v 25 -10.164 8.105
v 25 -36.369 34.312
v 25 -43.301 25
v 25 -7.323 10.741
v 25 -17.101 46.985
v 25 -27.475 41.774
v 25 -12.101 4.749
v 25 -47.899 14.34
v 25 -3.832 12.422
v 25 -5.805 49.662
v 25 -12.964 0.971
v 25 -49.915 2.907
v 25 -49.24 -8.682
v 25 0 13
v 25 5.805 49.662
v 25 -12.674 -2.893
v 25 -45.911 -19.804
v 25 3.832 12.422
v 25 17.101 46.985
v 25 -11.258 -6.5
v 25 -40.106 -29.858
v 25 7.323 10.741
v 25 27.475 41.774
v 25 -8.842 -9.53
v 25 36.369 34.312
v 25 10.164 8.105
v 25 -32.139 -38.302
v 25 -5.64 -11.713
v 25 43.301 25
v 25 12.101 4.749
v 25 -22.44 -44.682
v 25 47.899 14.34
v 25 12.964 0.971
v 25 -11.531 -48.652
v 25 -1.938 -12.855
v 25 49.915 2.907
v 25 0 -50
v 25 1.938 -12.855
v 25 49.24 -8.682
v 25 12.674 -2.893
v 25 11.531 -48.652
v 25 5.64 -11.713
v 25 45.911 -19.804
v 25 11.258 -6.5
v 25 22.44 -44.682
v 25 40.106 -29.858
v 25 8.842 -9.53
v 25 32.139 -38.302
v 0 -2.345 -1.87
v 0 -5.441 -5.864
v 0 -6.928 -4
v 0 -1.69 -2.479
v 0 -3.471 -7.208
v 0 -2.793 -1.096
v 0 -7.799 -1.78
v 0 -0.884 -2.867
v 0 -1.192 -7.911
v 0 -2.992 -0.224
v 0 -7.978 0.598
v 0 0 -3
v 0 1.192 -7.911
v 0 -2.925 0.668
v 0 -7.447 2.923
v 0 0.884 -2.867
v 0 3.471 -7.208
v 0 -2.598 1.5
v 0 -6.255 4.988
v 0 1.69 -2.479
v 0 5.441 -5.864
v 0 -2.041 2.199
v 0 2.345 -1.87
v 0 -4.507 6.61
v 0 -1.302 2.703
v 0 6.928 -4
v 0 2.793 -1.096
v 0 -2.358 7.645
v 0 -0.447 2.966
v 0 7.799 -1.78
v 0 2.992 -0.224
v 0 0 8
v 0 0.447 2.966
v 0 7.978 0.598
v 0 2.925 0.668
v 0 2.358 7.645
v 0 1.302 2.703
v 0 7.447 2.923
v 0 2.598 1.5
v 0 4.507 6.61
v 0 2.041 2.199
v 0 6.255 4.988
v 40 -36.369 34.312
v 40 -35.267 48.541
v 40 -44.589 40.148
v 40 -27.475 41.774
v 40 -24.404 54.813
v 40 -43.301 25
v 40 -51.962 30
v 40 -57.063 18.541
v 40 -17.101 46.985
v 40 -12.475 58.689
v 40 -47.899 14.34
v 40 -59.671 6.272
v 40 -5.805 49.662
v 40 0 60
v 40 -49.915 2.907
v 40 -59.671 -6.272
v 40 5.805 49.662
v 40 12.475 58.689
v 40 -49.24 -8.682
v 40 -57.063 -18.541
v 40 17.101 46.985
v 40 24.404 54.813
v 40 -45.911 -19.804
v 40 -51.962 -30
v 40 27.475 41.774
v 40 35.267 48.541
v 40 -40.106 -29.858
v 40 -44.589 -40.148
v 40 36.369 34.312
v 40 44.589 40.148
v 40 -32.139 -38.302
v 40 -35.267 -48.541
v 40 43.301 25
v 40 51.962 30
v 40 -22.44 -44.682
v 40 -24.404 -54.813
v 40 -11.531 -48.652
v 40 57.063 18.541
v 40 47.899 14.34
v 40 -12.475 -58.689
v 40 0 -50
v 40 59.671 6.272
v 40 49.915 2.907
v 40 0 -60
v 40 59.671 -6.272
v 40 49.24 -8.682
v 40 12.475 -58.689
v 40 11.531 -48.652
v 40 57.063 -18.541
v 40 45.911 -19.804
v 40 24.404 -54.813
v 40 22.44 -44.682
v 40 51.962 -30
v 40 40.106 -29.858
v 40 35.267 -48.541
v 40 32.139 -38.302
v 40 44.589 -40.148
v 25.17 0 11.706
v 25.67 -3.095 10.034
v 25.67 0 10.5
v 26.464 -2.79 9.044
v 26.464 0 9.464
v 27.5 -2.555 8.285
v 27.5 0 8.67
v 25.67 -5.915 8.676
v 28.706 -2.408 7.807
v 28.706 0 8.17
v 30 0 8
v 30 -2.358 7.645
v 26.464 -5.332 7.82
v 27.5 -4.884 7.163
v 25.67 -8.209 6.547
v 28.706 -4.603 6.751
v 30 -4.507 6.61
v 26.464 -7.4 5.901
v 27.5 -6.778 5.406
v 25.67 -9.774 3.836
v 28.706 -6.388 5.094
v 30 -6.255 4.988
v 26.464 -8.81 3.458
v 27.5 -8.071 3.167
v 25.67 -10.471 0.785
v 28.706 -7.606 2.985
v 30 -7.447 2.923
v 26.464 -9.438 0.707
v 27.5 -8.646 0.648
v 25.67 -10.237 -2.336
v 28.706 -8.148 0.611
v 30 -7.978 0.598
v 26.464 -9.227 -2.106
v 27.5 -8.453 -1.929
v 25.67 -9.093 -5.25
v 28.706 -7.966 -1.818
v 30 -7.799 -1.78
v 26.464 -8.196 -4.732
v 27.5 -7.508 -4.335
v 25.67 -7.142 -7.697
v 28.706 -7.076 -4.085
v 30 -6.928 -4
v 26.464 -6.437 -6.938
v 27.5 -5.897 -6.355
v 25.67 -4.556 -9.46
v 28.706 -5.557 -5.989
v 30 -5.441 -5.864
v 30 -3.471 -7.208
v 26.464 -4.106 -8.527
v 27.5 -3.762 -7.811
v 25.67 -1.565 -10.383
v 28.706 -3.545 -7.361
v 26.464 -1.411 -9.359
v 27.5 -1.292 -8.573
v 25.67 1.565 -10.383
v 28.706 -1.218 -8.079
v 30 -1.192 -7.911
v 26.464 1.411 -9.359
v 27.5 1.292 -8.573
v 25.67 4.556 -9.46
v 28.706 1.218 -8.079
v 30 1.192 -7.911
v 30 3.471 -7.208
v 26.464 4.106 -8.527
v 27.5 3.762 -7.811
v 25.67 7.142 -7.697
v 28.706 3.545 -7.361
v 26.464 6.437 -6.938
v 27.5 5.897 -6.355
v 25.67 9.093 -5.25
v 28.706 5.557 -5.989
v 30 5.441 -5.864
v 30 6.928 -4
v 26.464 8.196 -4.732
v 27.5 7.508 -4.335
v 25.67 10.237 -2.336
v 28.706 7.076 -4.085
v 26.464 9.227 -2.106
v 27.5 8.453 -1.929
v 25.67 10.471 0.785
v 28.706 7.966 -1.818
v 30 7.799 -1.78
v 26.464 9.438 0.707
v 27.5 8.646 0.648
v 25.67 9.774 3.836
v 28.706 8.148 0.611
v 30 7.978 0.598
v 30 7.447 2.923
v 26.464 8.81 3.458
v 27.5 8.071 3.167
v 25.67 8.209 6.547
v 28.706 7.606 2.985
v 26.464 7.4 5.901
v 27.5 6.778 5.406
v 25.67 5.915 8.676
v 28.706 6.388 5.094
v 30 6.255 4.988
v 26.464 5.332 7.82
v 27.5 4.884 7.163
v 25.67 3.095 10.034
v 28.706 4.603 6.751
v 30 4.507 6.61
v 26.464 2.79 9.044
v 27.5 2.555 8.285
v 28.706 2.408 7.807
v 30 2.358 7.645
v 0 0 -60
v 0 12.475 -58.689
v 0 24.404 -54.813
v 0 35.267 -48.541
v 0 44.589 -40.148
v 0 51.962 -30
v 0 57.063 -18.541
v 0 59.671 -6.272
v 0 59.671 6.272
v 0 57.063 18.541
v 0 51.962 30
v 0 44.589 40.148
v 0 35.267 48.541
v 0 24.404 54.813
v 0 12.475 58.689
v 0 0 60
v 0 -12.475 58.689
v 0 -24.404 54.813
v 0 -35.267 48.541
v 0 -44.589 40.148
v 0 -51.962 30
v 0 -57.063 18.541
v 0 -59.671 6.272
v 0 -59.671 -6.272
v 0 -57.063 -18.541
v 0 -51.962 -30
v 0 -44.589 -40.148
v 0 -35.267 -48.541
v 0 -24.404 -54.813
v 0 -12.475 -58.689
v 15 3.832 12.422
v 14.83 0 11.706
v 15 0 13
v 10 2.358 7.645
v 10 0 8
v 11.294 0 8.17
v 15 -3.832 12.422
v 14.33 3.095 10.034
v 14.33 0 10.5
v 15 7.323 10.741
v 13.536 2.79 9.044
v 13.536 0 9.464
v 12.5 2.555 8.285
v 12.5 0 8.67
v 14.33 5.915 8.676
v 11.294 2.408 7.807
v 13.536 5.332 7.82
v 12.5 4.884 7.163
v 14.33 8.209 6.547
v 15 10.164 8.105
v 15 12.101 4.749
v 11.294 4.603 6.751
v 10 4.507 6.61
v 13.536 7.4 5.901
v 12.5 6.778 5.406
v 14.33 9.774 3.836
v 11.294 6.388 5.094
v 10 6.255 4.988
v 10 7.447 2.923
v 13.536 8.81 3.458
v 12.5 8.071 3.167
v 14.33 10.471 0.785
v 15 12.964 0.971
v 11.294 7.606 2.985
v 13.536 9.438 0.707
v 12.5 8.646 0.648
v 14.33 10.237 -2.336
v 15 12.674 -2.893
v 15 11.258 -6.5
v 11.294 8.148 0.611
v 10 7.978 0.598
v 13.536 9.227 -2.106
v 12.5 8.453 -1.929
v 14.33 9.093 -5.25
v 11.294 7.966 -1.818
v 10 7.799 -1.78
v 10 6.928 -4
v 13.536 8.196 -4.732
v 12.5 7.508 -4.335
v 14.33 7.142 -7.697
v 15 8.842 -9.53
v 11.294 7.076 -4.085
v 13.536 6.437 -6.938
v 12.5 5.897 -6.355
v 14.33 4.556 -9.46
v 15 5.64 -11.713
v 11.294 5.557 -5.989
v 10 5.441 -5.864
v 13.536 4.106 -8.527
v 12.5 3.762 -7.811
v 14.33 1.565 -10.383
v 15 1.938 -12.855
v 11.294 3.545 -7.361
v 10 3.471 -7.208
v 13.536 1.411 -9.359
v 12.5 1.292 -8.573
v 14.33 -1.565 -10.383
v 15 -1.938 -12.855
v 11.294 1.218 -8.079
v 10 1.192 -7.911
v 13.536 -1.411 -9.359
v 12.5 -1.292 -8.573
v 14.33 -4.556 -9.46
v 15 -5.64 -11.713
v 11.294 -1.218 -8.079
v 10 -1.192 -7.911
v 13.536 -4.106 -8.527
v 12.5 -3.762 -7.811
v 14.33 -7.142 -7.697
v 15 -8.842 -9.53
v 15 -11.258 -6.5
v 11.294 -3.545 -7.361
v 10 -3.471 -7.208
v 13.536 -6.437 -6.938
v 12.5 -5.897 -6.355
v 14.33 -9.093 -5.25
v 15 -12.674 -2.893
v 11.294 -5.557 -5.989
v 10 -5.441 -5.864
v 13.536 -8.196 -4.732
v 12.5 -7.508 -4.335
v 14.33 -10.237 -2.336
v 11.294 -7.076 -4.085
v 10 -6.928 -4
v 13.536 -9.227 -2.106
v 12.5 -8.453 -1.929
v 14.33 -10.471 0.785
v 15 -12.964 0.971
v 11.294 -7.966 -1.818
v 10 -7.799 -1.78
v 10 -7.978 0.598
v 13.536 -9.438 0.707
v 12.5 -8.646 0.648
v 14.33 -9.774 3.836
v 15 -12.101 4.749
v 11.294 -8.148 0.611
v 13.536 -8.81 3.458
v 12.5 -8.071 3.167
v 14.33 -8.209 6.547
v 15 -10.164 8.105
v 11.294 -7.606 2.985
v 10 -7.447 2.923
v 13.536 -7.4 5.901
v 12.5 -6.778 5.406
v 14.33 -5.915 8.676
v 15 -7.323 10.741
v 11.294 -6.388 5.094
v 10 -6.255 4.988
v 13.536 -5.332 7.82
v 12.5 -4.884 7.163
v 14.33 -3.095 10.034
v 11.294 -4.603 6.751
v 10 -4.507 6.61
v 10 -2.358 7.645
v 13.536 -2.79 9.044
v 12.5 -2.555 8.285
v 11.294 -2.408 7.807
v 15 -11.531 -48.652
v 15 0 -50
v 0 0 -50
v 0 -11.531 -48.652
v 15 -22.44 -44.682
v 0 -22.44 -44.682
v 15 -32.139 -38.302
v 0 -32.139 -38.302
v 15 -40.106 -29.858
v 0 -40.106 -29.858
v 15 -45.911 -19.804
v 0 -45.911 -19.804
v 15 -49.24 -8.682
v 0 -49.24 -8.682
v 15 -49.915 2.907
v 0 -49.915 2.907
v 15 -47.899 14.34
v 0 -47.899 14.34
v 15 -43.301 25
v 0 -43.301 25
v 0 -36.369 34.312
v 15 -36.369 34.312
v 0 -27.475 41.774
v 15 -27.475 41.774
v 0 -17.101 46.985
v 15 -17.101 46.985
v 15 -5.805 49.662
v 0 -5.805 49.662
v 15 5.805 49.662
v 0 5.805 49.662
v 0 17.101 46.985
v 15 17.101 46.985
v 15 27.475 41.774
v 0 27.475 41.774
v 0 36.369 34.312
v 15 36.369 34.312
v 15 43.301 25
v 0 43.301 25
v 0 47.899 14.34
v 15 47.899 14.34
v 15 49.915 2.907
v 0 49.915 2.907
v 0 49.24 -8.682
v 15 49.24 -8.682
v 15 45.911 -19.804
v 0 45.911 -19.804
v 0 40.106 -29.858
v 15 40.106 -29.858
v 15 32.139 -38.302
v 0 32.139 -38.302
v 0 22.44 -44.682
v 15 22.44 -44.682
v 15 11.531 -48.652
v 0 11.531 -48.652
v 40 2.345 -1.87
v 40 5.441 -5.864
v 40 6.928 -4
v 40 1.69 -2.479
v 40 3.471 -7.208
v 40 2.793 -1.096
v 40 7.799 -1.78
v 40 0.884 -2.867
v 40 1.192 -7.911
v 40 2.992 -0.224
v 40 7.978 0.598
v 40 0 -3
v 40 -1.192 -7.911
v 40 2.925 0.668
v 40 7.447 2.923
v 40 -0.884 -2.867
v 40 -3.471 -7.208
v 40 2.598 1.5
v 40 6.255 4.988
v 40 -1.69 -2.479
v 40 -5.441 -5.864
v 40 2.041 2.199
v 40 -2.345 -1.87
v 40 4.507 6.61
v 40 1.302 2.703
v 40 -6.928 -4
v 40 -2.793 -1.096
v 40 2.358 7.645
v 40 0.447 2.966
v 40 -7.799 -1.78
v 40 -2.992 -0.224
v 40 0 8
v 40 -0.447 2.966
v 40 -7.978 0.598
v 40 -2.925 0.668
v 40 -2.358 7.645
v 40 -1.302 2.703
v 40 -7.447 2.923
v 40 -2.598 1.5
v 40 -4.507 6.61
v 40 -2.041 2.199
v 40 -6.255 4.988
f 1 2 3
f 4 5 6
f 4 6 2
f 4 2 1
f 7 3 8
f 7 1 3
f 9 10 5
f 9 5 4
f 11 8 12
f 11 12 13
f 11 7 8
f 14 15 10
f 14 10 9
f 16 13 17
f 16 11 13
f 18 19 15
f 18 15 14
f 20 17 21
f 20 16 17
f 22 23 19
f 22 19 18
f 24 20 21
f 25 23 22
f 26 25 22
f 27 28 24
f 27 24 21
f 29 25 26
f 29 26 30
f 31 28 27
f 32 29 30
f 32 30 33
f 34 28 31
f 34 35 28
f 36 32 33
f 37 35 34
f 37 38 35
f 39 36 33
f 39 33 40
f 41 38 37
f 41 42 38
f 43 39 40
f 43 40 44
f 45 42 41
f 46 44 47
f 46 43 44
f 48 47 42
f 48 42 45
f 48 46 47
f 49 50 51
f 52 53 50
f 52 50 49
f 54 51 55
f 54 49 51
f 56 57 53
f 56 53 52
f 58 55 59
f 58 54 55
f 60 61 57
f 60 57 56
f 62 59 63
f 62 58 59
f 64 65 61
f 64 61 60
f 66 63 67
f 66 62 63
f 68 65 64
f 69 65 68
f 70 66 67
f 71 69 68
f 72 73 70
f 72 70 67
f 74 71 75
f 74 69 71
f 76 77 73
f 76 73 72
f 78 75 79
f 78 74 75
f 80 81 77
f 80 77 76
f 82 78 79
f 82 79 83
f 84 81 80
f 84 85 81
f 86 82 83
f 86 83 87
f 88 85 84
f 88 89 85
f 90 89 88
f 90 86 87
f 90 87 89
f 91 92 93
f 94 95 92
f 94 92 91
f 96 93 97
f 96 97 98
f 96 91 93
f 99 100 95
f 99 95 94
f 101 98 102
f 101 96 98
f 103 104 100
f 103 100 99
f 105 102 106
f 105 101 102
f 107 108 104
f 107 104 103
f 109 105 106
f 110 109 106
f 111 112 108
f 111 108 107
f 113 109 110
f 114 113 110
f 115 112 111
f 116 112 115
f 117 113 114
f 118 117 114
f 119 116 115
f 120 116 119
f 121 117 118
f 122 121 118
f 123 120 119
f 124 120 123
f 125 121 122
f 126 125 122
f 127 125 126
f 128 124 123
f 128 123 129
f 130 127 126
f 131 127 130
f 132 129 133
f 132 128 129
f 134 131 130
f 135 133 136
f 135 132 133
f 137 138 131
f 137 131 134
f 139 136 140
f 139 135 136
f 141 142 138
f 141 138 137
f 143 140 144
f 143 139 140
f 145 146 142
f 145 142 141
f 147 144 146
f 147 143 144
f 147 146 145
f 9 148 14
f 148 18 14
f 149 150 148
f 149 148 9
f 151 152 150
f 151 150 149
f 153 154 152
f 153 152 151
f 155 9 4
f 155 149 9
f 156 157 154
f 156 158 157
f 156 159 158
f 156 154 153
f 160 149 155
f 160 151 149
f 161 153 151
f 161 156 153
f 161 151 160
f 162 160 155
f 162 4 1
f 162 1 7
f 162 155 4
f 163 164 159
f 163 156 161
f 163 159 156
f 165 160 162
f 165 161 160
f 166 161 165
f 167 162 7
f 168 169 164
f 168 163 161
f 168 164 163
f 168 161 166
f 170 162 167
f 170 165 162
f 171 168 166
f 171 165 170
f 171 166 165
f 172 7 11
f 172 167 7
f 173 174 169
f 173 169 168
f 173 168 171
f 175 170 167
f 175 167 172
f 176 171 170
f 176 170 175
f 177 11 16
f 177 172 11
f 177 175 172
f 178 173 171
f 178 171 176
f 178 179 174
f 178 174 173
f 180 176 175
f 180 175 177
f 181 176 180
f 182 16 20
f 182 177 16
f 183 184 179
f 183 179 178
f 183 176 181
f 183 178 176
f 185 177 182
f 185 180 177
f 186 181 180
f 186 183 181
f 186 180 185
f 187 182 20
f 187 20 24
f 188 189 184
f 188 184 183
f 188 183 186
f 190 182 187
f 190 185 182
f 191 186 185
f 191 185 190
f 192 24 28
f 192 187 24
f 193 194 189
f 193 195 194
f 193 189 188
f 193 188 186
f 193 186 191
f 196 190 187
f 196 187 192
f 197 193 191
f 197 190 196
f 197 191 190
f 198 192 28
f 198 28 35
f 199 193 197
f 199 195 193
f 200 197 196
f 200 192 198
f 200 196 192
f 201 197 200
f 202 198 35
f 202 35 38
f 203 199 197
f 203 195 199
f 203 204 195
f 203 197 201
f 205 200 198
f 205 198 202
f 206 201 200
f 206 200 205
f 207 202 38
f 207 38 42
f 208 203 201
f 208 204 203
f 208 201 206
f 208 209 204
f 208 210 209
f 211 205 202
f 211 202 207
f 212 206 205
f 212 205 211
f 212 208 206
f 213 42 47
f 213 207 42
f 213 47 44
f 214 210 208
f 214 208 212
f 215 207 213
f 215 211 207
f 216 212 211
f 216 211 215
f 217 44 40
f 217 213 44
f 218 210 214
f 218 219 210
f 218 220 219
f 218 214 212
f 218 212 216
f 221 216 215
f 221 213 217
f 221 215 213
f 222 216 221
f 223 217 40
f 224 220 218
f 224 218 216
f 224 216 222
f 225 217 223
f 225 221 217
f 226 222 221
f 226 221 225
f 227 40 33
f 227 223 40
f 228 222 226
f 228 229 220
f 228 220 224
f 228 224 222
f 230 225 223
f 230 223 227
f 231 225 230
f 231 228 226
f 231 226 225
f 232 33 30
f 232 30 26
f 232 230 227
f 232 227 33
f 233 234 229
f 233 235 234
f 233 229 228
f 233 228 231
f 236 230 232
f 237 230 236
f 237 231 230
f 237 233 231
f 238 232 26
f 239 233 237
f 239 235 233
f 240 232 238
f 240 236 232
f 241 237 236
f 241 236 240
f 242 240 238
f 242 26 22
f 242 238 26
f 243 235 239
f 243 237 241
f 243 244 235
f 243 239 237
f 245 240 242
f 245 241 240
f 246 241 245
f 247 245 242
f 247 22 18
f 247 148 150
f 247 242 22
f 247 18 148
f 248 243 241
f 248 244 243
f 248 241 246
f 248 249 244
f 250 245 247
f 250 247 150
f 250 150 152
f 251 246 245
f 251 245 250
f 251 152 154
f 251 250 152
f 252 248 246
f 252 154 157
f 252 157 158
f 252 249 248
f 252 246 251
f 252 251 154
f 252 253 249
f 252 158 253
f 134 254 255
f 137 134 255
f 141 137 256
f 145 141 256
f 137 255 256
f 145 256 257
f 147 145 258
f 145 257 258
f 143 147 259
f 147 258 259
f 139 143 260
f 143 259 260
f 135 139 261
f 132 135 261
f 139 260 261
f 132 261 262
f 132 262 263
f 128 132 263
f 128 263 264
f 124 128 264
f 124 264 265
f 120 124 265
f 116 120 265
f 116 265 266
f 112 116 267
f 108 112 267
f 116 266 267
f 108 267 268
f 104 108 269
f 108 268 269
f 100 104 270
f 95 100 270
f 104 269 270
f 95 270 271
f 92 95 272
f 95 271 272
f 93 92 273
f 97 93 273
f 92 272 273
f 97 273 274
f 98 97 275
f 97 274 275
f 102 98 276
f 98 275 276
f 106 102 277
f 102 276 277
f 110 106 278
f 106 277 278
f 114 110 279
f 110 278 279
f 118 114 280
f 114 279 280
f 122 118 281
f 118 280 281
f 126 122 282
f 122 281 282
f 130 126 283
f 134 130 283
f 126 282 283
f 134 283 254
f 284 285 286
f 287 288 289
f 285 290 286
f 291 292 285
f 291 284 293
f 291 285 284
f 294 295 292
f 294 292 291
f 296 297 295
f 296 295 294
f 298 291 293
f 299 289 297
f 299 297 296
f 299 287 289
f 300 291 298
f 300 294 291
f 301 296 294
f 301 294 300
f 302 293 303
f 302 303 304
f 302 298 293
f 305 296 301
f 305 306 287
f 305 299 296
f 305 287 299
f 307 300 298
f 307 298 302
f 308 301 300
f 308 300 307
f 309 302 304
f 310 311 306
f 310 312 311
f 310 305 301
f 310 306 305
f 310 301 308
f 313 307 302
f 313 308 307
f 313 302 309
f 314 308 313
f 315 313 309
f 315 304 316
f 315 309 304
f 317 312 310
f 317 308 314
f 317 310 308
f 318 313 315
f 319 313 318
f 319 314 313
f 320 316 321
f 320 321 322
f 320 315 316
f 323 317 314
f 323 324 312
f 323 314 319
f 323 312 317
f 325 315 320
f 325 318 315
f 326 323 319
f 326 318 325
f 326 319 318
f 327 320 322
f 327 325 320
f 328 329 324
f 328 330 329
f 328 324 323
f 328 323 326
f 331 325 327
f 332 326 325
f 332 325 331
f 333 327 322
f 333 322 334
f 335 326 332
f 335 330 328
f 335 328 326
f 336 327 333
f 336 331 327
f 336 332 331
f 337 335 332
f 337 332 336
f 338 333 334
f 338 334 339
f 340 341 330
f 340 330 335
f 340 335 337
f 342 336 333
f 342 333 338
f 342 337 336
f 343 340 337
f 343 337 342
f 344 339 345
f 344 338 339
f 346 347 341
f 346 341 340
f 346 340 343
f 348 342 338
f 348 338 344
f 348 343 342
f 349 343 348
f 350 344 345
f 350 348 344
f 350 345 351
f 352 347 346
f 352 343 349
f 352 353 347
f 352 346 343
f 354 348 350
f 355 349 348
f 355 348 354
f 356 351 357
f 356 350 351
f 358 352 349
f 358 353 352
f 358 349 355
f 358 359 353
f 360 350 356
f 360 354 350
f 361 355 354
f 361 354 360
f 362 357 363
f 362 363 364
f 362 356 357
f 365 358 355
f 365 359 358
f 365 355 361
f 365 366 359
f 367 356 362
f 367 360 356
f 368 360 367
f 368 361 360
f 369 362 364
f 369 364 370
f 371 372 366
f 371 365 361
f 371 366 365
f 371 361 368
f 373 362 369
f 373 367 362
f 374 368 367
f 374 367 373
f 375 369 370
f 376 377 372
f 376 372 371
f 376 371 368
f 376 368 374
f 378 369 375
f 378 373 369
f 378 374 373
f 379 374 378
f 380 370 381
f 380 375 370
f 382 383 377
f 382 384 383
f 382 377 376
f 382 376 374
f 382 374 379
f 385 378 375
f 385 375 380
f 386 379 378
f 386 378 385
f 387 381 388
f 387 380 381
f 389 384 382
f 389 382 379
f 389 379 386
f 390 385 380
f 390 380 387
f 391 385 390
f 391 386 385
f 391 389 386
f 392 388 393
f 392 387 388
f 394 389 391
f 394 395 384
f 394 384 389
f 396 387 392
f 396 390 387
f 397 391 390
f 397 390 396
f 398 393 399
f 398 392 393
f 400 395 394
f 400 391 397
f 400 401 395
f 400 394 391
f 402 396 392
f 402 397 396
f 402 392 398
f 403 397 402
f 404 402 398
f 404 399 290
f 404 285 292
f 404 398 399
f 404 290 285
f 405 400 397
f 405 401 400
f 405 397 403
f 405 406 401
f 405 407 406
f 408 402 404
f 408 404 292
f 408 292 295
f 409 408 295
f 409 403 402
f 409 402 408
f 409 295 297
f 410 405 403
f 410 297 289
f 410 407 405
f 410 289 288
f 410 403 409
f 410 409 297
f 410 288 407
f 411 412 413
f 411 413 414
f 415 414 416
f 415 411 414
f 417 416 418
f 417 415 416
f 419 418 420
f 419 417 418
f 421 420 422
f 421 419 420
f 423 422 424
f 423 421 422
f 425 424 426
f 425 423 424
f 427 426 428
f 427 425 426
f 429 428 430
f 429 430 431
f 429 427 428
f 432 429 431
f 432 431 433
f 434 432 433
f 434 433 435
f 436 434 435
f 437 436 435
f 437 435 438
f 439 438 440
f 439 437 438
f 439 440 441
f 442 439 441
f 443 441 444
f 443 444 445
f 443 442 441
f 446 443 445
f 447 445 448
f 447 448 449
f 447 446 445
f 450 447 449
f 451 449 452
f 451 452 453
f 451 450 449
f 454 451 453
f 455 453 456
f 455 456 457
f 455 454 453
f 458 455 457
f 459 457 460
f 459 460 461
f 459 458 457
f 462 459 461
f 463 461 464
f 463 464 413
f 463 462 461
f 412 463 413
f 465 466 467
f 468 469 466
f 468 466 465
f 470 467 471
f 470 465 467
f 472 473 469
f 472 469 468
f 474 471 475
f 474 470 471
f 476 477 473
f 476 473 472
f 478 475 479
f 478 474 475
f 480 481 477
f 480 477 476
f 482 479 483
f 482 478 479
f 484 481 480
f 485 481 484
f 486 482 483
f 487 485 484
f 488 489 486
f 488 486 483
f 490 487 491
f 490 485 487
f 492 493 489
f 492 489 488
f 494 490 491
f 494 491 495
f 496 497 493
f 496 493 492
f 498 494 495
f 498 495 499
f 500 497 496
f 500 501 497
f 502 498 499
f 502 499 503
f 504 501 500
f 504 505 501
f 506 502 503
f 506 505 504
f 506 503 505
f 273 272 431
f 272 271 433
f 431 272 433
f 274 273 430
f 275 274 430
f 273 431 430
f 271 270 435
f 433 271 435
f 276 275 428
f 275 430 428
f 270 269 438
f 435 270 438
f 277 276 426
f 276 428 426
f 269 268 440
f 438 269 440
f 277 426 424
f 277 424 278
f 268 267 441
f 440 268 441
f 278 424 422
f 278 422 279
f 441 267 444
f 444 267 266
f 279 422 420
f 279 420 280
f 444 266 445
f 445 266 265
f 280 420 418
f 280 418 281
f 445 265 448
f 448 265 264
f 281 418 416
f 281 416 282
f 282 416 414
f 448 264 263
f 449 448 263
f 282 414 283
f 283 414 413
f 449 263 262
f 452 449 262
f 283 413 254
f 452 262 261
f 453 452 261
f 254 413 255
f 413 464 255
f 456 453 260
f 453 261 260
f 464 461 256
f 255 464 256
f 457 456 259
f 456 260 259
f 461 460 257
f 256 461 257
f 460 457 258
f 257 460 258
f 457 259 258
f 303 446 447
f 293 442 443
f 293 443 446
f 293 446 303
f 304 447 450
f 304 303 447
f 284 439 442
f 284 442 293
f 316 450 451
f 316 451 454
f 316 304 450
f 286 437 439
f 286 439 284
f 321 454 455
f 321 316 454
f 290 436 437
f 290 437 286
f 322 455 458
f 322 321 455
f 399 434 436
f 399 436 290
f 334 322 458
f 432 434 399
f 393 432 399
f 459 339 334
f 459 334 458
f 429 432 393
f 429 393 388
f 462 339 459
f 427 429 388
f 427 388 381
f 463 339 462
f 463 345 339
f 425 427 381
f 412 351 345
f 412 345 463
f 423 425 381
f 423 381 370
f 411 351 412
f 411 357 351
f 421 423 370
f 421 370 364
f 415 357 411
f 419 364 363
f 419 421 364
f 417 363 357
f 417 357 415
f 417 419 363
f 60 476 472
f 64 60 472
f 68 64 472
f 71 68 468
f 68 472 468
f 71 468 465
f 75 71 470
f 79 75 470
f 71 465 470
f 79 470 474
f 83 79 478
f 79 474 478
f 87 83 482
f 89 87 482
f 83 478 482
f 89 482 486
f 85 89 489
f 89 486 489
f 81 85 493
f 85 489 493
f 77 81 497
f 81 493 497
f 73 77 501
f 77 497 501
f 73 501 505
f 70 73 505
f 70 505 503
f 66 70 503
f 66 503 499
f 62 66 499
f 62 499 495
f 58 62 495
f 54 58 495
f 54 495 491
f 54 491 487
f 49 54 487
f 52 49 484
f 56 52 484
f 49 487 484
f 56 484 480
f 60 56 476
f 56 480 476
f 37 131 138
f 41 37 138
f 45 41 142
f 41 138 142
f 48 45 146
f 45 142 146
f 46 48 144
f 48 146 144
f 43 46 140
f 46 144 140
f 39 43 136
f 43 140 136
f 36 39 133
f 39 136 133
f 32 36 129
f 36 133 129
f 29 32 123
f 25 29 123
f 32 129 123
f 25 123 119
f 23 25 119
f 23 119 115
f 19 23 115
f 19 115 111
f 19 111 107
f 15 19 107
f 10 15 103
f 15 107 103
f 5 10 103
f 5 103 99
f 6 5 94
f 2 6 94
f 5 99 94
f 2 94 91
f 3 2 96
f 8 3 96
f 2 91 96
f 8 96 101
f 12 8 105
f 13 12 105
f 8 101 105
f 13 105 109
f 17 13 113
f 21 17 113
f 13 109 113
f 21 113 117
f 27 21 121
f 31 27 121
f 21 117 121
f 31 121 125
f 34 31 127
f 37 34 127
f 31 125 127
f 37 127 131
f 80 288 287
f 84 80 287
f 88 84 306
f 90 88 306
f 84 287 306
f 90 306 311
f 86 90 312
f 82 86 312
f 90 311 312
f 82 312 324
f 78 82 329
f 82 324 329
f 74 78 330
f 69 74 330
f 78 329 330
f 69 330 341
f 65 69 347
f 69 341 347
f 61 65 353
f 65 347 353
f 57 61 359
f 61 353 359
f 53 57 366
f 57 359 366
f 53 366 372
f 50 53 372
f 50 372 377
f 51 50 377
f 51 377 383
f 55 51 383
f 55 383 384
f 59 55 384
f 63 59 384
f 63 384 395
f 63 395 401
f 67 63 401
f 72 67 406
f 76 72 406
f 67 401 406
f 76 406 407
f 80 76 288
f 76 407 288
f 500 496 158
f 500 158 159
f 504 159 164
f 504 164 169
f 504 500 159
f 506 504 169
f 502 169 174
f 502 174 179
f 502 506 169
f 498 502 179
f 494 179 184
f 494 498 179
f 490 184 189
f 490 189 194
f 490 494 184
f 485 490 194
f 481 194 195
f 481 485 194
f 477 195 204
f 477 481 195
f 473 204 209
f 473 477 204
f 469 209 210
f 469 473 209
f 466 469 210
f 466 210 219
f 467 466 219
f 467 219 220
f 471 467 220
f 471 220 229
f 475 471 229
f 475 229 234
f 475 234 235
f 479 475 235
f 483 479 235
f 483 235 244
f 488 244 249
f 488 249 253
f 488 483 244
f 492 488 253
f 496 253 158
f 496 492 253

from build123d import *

# Parameters (mm, degrees)
SKETCH2_R           = 60
BOSS_EXTRUDE1_DEPTH = 40
SKETCH3_R           = 50
CUT_EXTRUDE1_DEPTH  = 15
CUT_EXTRUDE2_START  = -15
SKETCH4_R           = 50
CUT_EXTRUDE2_DEPTH  = 15
SKETCH5_R           = 8
BOSS_EXTRUDE2_DEPTH = 15
BOSS_EXTRUDE3_START = 15
SKETCH6_R           = 8
BOSS_EXTRUDE3_DEPTH = 15
SKETCH7_R           = 3
CUT_EXTRUDE3_DEPTH  = 40
FILLET2_R           = 5


with BuildPart() as part:
    # Sketch2 → Boss-Extrude1 (new body)
    with BuildSketch(Plane(origin=(0, 0, 0), x_dir=(0, 0, -1), z_dir=(1, 0, 0))):
        Circle(SKETCH2_R)
    extrude(amount=BOSS_EXTRUDE1_DEPTH)

    # Sketch3 → Cut-Extrude1 (cut)
    with BuildSketch(Plane(origin=(40, 0, 0), x_dir=(0, 0, -1), z_dir=(1, 0, 0))):
        Circle(SKETCH3_R)
    extrude(amount=-CUT_EXTRUDE1_DEPTH, mode=Mode.SUBTRACT)

    # Sketch4 → Cut-Extrude2 (cut)
    with BuildSketch(Plane.ZY.offset(CUT_EXTRUDE2_START)):
        with Locations(Location((0, 0, 0), (0, 0, 180))):
            Circle(SKETCH4_R)
    extrude(amount=CUT_EXTRUDE2_DEPTH, mode=Mode.SUBTRACT)

    # Sketch5 → Boss-Extrude2 (add)
    with BuildSketch(Plane.ZY.offset(-15)):
        Circle(SKETCH5_R)
    extrude(amount=BOSS_EXTRUDE2_DEPTH)

    # Sketch6 → Boss-Extrude3 (add)
    with BuildSketch(Plane(origin=(25, 0, 0), x_dir=(0, 0, -1), z_dir=(1, 0, 0)).offset(BOSS_EXTRUDE3_START)):
        with Locations(Location((0, 0, 0), (0, 0, 180))):
            Circle(SKETCH6_R)
    extrude(amount=-BOSS_EXTRUDE3_DEPTH)

    # Sketch7 → Cut-Extrude3 (cut)
    with BuildSketch(Plane(origin=(40, 0, 0), x_dir=(0, 0, -1), z_dir=(1, 0, 0))):
        Circle(SKETCH7_R)
    extrude(amount=-CUT_EXTRUDE3_DEPTH, mode=Mode.SUBTRACT)

    # Fillet2
    fillet2_edges = [part.edges().sort_by_distance(p)[0] for p in [
        (15, 0, -8),
        (25, 0, -8),
    ]]
    fillet(fillet2_edges, radius=FILLET2_R)


solid = part.part
